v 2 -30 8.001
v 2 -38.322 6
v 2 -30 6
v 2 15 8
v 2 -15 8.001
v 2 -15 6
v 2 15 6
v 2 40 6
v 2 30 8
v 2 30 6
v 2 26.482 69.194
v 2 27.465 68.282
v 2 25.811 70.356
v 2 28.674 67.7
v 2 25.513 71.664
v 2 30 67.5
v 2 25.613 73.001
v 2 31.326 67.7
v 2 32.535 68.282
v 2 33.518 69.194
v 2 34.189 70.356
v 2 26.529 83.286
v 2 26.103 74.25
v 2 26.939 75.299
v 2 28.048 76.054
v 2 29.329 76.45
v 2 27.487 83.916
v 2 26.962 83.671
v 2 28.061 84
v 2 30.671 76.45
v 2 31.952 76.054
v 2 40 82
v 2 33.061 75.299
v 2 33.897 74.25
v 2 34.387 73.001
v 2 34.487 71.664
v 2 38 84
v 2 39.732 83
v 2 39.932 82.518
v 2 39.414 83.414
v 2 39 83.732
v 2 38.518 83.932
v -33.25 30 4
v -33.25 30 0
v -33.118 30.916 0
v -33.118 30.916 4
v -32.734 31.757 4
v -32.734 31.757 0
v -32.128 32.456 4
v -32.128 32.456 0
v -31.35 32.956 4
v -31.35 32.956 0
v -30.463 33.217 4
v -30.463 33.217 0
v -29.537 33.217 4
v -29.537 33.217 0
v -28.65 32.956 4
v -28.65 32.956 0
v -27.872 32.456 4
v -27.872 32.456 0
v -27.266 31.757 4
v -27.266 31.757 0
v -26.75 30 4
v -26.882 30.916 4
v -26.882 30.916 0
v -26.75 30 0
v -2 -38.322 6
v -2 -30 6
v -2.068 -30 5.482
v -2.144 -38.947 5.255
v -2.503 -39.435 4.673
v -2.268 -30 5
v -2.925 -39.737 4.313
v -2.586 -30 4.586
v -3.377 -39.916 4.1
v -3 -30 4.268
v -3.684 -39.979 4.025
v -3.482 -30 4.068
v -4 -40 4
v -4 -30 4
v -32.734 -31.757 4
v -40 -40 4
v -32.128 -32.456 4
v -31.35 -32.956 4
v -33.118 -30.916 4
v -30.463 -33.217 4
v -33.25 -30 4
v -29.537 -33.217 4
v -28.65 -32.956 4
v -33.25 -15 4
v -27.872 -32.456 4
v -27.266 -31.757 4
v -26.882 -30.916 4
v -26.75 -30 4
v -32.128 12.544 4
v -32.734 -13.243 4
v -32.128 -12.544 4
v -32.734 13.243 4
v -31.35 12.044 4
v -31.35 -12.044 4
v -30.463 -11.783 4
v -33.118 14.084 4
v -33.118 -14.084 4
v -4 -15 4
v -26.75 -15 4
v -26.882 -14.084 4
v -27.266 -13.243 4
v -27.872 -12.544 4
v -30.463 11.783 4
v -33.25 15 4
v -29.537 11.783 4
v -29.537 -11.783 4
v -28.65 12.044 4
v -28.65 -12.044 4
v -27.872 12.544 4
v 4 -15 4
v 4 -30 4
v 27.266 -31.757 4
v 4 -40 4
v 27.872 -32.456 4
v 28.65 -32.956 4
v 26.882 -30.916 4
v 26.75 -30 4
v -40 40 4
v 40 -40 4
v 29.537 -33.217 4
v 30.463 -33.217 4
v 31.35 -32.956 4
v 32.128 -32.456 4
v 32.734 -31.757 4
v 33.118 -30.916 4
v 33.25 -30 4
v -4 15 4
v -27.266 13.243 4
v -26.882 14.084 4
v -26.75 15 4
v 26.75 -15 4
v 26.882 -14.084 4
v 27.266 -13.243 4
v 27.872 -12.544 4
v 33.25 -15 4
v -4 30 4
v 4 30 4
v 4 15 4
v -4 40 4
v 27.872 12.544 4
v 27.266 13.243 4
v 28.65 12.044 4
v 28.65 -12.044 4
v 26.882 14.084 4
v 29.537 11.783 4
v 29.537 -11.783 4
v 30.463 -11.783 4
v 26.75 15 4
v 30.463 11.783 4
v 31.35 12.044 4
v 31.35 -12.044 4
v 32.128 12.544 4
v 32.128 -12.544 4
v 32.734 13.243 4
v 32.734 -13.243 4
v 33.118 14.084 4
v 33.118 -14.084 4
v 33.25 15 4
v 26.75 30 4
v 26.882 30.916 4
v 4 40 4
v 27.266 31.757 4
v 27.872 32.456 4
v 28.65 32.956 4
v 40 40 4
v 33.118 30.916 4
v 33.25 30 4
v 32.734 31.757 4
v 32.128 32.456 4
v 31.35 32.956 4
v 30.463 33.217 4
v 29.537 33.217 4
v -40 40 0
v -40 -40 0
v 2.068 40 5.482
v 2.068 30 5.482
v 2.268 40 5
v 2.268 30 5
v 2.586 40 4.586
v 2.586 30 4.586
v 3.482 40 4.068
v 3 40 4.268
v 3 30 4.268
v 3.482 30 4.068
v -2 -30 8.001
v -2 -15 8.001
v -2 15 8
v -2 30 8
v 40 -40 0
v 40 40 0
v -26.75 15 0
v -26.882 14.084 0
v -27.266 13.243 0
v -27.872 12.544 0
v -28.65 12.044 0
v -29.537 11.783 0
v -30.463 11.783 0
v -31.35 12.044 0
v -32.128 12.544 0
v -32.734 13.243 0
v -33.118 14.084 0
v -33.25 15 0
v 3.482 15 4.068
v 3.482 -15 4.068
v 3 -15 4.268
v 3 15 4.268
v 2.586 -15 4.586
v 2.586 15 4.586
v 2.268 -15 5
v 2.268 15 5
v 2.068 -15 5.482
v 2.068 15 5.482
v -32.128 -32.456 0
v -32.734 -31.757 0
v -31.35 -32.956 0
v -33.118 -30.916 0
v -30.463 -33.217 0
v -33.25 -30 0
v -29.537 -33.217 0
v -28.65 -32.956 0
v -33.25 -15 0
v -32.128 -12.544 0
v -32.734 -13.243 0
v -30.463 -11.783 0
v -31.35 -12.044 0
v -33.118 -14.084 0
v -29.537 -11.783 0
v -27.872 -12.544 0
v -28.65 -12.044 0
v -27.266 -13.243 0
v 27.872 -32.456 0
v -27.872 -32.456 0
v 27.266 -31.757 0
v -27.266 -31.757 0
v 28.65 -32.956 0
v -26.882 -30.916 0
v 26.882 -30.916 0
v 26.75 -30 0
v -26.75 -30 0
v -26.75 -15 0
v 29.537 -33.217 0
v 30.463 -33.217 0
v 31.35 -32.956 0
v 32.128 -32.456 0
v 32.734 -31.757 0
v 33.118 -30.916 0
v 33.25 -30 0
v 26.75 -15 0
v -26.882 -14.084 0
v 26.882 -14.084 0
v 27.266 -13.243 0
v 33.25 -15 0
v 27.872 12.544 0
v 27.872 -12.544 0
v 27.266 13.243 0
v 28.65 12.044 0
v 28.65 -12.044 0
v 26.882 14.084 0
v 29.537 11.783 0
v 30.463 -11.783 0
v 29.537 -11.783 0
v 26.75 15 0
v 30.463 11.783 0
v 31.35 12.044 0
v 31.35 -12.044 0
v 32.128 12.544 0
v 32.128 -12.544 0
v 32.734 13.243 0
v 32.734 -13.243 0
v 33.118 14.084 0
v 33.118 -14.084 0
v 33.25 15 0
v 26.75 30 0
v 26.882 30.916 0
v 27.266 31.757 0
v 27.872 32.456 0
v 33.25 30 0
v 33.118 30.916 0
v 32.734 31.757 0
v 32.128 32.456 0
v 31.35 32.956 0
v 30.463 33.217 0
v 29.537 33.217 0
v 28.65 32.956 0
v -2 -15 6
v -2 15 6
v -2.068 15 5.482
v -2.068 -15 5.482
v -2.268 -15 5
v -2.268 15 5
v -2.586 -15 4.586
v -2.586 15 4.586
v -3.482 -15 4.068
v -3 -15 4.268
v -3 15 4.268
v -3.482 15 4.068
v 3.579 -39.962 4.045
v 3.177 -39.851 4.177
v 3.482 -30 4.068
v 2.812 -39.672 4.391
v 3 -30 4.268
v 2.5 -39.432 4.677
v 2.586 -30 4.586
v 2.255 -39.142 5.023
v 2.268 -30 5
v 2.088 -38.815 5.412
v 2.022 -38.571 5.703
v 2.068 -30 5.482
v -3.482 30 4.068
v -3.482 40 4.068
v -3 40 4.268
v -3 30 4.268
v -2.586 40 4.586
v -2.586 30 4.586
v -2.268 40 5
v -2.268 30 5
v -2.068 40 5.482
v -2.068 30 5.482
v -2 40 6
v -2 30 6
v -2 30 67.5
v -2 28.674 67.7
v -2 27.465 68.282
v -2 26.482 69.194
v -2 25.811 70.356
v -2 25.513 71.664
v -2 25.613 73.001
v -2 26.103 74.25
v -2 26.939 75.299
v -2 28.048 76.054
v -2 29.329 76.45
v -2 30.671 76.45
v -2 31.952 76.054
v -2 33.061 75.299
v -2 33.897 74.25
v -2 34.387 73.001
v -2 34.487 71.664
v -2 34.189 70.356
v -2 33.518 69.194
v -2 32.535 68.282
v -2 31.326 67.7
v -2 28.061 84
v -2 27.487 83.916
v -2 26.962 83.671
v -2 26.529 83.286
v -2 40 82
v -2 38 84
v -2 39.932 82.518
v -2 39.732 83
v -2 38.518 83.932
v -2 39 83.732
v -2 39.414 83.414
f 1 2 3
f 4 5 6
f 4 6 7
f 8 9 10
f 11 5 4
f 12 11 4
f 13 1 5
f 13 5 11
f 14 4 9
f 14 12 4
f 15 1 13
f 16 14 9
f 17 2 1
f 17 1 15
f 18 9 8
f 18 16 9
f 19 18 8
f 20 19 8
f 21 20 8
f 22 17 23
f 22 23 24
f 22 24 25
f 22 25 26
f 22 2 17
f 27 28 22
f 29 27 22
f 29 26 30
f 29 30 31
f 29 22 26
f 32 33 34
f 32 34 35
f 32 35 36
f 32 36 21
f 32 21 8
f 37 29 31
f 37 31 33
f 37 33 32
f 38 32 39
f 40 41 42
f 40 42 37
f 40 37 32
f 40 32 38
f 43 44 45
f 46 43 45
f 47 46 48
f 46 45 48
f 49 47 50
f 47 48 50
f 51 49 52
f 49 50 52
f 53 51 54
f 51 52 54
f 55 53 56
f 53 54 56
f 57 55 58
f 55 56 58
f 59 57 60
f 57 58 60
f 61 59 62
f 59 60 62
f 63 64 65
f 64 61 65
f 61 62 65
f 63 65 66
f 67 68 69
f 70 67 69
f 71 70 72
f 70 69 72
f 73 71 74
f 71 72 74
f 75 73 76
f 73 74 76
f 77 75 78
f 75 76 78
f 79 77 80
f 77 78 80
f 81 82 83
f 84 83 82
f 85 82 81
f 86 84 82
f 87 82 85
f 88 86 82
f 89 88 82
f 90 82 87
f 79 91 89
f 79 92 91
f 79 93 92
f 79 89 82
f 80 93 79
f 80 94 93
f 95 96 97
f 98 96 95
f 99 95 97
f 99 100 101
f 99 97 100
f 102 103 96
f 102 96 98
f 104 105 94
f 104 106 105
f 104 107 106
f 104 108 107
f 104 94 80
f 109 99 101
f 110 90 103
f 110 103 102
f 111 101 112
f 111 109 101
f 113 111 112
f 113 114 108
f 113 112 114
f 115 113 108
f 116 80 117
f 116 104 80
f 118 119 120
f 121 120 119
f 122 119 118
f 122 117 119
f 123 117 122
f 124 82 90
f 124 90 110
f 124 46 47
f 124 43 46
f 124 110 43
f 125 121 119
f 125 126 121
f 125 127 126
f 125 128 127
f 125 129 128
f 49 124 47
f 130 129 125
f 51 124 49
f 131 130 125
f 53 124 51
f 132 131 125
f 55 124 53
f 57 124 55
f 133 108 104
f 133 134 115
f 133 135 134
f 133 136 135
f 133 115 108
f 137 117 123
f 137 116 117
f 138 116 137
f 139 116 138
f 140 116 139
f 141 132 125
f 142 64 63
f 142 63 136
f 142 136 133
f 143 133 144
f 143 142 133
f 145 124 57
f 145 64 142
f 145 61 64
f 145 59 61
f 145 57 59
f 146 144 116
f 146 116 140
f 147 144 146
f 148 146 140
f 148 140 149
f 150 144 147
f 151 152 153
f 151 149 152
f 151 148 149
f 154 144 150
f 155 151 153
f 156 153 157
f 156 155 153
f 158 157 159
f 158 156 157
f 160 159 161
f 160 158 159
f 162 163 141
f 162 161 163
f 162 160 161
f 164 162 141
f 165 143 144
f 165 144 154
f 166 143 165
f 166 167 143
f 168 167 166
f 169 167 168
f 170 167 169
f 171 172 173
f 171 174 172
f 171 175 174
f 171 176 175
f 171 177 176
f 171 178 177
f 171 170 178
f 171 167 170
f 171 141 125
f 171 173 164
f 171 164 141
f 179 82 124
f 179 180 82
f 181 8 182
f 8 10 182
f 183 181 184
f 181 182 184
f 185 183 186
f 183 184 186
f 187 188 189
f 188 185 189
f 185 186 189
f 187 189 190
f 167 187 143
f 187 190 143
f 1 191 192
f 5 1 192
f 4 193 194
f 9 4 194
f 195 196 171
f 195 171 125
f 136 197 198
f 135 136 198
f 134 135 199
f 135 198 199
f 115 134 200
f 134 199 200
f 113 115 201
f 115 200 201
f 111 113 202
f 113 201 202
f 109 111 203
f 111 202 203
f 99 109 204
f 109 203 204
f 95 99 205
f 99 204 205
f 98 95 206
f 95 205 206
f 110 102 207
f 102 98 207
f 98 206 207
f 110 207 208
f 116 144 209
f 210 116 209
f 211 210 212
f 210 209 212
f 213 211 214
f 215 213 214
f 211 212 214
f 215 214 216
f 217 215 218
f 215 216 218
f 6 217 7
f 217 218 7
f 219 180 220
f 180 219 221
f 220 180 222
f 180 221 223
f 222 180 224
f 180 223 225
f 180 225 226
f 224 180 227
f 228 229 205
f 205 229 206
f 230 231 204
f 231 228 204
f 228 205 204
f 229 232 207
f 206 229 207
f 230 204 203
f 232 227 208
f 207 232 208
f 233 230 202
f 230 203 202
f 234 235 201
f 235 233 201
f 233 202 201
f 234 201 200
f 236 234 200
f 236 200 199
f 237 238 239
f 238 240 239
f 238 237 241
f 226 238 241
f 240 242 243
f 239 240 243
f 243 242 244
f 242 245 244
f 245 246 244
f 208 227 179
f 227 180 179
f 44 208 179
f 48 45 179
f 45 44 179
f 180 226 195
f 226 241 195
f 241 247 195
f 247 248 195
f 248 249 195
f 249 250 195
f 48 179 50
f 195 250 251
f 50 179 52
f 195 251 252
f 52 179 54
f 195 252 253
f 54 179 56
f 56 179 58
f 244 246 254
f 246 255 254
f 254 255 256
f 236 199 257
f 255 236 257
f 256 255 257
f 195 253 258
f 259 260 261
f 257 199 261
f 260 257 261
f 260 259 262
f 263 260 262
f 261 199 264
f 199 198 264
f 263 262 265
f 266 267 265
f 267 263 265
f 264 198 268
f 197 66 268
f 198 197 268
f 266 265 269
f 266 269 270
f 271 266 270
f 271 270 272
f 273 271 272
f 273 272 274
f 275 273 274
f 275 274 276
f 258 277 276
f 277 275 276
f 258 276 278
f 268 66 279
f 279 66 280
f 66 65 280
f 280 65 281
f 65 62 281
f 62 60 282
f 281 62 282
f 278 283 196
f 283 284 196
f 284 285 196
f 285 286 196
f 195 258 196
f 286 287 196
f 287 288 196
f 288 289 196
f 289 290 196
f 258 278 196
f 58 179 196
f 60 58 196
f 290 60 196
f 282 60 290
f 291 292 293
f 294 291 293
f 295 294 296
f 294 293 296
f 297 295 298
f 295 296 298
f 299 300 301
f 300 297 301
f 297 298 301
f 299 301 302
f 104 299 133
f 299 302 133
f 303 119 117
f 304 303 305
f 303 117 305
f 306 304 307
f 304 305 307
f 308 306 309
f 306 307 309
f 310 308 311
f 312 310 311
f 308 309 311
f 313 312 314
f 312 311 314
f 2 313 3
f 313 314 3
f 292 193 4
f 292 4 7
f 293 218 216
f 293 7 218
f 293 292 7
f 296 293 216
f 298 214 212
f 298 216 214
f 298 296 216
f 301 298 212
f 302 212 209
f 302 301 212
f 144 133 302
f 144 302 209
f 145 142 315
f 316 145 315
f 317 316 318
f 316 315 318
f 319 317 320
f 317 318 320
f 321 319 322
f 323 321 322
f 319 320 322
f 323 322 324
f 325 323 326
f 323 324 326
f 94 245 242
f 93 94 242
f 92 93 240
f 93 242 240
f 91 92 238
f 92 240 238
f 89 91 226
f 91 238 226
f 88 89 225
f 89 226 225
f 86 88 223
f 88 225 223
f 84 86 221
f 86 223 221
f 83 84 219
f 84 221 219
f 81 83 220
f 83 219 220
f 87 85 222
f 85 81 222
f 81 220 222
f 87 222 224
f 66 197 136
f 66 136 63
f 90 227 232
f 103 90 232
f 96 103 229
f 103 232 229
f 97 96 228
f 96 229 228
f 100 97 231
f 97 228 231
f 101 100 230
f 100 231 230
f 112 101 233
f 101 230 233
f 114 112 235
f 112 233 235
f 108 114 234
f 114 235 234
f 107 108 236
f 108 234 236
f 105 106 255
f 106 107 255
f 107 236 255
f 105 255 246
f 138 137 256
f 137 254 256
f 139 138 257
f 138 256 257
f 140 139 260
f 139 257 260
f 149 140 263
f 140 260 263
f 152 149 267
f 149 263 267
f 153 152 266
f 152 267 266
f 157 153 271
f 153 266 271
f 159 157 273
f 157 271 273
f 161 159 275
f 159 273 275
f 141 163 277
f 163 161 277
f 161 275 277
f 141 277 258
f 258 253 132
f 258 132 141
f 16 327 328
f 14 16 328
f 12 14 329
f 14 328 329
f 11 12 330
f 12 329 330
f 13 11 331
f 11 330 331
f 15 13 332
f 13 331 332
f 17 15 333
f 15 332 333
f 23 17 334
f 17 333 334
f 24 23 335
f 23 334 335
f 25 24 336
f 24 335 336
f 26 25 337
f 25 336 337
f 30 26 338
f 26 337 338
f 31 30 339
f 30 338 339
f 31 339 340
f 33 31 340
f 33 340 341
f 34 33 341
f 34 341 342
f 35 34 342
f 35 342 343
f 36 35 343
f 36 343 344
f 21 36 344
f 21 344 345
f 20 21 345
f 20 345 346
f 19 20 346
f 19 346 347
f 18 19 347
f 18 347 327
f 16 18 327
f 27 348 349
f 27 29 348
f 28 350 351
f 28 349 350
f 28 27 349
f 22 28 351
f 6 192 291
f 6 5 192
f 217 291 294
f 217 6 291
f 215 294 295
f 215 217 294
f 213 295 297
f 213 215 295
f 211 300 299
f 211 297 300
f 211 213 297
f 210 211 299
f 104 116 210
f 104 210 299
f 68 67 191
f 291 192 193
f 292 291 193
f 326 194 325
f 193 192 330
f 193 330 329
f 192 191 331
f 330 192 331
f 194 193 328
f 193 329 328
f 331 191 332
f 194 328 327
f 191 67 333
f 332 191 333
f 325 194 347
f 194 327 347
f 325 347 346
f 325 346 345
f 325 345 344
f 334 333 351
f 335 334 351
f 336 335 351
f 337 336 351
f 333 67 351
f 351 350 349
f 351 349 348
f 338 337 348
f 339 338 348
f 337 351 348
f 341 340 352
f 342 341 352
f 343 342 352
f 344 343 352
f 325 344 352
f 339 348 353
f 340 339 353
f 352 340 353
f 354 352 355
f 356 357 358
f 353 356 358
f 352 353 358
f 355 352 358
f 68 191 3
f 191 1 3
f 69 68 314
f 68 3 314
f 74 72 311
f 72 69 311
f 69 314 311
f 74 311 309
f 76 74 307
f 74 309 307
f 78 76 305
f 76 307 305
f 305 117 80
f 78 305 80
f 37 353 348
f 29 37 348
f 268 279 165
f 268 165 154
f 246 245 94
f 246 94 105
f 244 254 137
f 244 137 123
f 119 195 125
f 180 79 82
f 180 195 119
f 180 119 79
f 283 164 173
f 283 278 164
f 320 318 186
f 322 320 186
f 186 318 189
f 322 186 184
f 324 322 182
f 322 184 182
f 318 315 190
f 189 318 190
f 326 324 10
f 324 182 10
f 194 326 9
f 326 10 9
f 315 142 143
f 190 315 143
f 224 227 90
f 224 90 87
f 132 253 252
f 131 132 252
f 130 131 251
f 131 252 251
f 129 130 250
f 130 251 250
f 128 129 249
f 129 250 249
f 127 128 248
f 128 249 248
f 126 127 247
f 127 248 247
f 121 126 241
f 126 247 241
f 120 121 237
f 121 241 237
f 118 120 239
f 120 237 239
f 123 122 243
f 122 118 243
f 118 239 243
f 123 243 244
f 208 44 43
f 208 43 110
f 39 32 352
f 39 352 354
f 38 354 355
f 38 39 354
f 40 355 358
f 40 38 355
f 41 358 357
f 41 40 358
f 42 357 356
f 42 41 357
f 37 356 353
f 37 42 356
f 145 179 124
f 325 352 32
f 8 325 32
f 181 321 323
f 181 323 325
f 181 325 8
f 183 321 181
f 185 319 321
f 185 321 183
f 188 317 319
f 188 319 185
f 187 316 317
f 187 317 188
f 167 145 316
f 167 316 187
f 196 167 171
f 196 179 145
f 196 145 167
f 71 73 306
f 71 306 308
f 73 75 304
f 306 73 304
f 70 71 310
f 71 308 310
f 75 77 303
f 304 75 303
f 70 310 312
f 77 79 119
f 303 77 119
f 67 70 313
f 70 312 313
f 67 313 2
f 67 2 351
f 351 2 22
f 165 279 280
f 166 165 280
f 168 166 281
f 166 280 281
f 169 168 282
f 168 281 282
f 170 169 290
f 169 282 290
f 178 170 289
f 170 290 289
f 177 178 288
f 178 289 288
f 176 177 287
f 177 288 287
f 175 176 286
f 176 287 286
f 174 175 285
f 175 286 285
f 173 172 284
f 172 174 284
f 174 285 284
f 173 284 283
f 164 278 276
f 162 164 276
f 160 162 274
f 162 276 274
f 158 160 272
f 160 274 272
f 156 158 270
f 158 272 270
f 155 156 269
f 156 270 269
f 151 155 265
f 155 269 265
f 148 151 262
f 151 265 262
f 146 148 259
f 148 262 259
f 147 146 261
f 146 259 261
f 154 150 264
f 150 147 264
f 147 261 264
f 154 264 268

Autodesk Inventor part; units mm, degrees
ref_plane "YZ Plane" through (0, 0, 0) normal (1, 0, 0) x (0, 1, 0)
ref_plane "XZ Plane" through (0, 0, 0) normal (0, 1, 0) x (-1, 0, 0)
ref_plane "XY Plane" through (0, 0, 0) normal (0, 0, 1) x (1, 0, 0)
sketch "Sketch2" plane through (0, 0, 0) normal (0, 0, 1) x (1, 0, 0)
  line L0 (40, -40) -> (-40, -40)
  line L1 (-40, -40) -> (-40, 40)
  line L2 (-40, 40) -> (40, 40)
  line L3 (40, 40) -> (40, -40)
  line L4 (-56, 0) -> (56, 0) construction
  line L5 (0, 56) -> (0, -56) construction
  line L6 (-30, 33.25) -> (-30, 11.75) construction
  line L7 (-33.25, 30) -> (-33.25, 15)
  line L8 (-26.75, 15) -> (-26.75, 30)
  arc A0 (-26.75, 30) -> (-33.25, 30) centre (-30, 30) ccw
  arc A1 (-33.25, 15) -> (-26.75, 15) centre (-30, 15) ccw
  line L9 (-26.75, -30) -> (-26.75, -15)
  arc A2 (-26.75, -15) -> (-33.25, -15) centre (-30, -15) ccw
  line L10 (-33.25, -15) -> (-33.25, -30)
  arc A3 (-33.25, -30) -> (-26.75, -30) centre (-30, -30) ccw
  line L11 (33.25, 15) -> (33.25, 30)
  arc A4 (33.25, 30) -> (26.75, 30) centre (30, 30) ccw
  line L12 (26.75, 30) -> (26.75, 15)
  arc A5 (26.75, 15) -> (33.25, 15) centre (30, 15) ccw
  line L13 (33.25, -30) -> (33.25, -15)
  arc A6 (33.25, -15) -> (26.75, -15) centre (30, -15) ccw
  line L14 (26.75, -15) -> (26.75, -30)
  arc A7 (26.75, -30) -> (33.25, -30) centre (30, -30) ccw
  point P0 (0, 0)
  point P1 (0, 0)
  point P2 (0, 0)
  point P3 (-30, 22.5)
  dimension "d10" = 80
  dimension "d11" = 80
  dimension "d12" = 40
  dimension "d13" = 40
  dimension "d14" = 6.5
  dimension "d15" = 10
  dimension "d16" = 10
  dimension "d17" = 15
  dimension "d20" = 45
  dimension "d23" = 60
  dimension "d26" = 6.75
extrude "Extrusion1" add sketch "Sketch2" along normal blind 4
sketch "Sketch3" plane through (0, 0, 0) normal (1, 0, 0) x (0, 1, 0)
  line L0 (33.25, 4) -> (33.25, 0) construction
  line L1 (11.75, 4) -> (11.75, 0) construction
  line L2 (30, 0) -> (15, 0) construction
  line L3 (15, 0) -> (15, 4) construction
  line L4 (30, 4) -> (15, 4) construction
  line L5 (30, 0) -> (30, 4) construction
  line L6 (-15, 0) -> (-30, 0) construction
  line L7 (-30, 0) -> (-30, 4) construction
  line L8 (-15, 4) -> (-30, 4) construction
  line L9 (-15, 0) -> (-15, 4) construction
  line L10 (40, 0) -> (-40, 0) construction
  line L11 (-40, 0) -> (-40, 4) construction
  line L12 (40, 4) -> (-40, 4) construction
  line L13 (40, 0) -> (40, 4) construction
  line L14 (40, 4) -> (40, 84)
  line L15 (40, 84) -> (27.128, 84)
  line L16 (27.128, 84) -> (-40, 4)
  line L17 (-33.25, 4) -> (-33.25, 0) construction
  line L18 (-11.75, 4) -> (-11.75, 0) construction
  line L19 (-30, 8.0014) -> (-15, 8.0014)
  line L20 (15, 8) -> (30, 8)
  line L21 (-15, 8.0014) -> (-15, 4)
  line L22 (-30, 8.0014) -> (-30, 4)
  line L23 (30, 8) -> (30, 4)
  line L24 (15, 8) -> (15, 4)
  line L25 (30, 4) -> (40, 4)
  line L26 (15, 4) -> (-15, 4)
  line L27 (-30, 4) -> (-40, 4)
  point P0 (0, 0)
  dimension "d29" = 80
  dimension "d30" = 4
  dimension "d32" = 130
  dimension "d34" = 4.0014
extrude "Extrusion2" add sketch "Sketch3" along normal mid plane 4
fillet "Fillet1" radius 2 6 edges at (-2, 0, 4) (-2, 35, 4) (-2, -35, 4) (2, 0, 4) (2, 35, 4) (2, -35, 4)
fillet "Fillet2" radius 2 2 edges at (0, 27.128, 84) (0, 40, 84)
sketch "Sketch4" plane through (2, 0, 0) normal (1, 0, 0) x (0, 0, -1)
  arc A0 (-82, 40) -> (-84, 38) centre (-82, 38) ccw construction
  line L0 (-84, 38) -> (-84, 28.0606) construction
  arc A1 (-84, 28.0606) -> (-83.2856, 26.5285) centre (-82, 28.0606) ccw construction
  line L1 (-83.2856, 26.5285) -> (-6, -38.3218) construction
  line L2 (-6, -30) -> (-6, -38.3218) construction
  line L3 (-6, -30) -> (-8.0014, -30) construction
  line L4 (-8.0014, -30) -> (-8.0014, -15) construction
  line L5 (-8.0014, -15) -> (-6, -15) construction
  line L6 (-6, 15) -> (-6, -15) construction
  line L7 (-6, 15) -> (-8, 15) construction
  line L8 (-8, 15) -> (-8, 30) construction
  line L9 (-8, 30) -> (-6, 30) construction
  line L10 (-6, 40) -> (-6, 30) construction
  line L11 (-6, 40) -> (-82, 40) construction
  point P0 (0, 0)
  point P1 (-72, 30)
  dimension "d39" = 12
  dimension "d40" = 10
hole "Hole1" at (2, 30, 72) direction (-1, 0, 0) diameter 9 depth 10
properties part number "P045_SupportUniversel"
